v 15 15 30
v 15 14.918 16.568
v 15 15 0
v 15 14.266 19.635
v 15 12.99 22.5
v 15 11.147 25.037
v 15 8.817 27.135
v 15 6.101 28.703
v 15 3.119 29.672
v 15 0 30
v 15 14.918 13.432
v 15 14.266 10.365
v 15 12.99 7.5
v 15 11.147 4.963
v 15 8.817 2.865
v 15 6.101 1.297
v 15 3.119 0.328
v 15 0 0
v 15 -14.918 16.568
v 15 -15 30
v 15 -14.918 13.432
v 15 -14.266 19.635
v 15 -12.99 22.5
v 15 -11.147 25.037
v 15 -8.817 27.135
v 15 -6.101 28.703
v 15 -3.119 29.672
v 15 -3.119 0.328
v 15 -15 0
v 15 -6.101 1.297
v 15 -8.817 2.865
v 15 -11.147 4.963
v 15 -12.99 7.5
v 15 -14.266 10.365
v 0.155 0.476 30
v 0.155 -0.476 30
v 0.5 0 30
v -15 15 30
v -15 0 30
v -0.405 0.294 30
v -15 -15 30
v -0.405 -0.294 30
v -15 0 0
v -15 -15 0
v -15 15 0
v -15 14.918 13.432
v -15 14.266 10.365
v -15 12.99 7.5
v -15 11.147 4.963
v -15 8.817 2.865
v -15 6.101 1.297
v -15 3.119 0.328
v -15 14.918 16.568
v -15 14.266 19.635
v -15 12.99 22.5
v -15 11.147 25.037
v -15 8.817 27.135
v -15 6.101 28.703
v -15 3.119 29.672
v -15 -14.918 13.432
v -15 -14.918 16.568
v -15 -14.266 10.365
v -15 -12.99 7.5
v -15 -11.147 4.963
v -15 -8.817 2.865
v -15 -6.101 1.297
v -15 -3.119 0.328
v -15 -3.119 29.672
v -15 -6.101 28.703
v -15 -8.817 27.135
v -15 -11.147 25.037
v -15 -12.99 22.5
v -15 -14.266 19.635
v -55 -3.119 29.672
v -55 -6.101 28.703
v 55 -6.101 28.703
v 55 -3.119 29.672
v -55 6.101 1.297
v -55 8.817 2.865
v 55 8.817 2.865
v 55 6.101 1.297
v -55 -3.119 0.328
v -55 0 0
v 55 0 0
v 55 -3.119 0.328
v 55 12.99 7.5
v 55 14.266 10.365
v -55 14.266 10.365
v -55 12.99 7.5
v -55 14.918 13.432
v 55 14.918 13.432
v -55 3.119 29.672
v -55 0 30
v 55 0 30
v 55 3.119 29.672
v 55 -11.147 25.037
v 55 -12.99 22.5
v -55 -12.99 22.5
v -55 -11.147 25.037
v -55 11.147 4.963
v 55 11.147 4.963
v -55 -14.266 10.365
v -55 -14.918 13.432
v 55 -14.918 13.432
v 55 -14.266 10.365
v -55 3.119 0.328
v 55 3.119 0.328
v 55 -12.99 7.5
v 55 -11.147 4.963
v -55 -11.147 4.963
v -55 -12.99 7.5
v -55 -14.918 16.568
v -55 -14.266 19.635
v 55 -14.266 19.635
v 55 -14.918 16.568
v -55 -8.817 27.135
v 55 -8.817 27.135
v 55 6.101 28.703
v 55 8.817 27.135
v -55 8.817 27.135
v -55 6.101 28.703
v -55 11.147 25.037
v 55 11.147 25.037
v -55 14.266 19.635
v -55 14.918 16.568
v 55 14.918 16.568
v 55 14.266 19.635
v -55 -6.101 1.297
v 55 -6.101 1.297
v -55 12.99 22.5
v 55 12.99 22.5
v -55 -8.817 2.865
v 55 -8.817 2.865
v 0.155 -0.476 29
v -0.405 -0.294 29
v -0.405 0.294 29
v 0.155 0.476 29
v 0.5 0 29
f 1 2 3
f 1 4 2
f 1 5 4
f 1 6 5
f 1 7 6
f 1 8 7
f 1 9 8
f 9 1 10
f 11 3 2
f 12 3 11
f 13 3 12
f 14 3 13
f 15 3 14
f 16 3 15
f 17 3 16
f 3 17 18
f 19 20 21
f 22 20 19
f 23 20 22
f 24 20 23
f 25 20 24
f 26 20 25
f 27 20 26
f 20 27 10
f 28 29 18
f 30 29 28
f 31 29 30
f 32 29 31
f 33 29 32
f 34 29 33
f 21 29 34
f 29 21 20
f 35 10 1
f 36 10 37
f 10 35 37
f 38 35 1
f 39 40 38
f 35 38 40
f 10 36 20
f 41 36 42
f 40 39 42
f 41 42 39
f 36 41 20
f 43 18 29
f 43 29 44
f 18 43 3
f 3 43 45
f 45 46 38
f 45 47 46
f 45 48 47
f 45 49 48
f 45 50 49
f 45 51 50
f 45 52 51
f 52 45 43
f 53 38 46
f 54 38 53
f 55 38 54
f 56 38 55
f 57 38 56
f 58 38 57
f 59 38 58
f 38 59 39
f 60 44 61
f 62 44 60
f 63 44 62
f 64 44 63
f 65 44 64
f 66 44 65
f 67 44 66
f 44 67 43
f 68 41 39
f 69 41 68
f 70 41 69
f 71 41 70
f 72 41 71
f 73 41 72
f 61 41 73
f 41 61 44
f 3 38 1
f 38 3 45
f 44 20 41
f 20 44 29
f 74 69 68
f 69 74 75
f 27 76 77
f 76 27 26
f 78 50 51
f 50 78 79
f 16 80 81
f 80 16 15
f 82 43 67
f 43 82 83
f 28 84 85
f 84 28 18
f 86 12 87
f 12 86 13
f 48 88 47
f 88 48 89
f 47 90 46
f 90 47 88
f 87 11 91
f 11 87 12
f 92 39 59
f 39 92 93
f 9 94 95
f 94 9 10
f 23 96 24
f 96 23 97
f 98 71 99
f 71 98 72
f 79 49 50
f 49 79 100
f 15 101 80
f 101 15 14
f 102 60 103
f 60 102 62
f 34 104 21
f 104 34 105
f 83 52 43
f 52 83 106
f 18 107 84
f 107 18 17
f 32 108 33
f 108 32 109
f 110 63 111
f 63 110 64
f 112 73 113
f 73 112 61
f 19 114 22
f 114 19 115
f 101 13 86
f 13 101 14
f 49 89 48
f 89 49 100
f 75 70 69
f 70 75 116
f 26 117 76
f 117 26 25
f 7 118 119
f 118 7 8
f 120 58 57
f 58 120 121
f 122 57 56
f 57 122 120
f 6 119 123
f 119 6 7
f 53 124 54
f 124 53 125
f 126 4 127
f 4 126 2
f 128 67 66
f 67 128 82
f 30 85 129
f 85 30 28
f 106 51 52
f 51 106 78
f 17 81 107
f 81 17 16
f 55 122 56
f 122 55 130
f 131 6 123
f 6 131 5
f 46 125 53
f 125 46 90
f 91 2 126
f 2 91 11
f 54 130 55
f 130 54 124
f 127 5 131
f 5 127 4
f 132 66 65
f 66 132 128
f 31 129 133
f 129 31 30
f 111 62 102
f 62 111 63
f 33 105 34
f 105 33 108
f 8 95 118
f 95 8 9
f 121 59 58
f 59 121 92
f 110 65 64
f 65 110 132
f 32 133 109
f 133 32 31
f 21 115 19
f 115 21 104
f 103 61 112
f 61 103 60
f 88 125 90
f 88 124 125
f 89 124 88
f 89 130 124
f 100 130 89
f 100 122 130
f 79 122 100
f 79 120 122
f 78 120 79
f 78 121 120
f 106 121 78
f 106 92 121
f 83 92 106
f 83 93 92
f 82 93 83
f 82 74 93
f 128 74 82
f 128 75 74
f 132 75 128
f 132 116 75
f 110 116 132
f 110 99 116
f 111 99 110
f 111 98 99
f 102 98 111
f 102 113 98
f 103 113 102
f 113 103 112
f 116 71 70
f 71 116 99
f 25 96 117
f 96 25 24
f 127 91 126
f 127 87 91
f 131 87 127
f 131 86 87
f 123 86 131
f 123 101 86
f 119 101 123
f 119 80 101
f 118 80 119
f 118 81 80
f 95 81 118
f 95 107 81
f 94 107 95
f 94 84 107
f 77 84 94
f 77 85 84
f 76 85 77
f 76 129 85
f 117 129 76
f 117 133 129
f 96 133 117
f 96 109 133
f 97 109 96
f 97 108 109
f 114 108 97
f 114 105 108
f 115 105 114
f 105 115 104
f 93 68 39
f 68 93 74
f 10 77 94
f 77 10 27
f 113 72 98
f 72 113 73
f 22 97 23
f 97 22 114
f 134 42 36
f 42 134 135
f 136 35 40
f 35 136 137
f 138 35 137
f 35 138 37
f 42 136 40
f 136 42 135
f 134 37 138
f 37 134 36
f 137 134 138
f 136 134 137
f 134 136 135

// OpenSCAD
cube_size = 30; // [10:Small,20:Medium,30:Large]

hole_diameter = 1; 
hole_radius = hole_diameter/2;

// How deep should the center hole be?
hole_depth = 1; // [0,1,5,50]

show_wheels = "yes"; // [yes,no]

// How thick should the side wheels be?
wheel_thickness = 40; // [1:40]

// ignore this variable!
// foo=1;

// don't turn functions into params!
function BEZ03(u) = pow((1-u), 3);

// ignore variable values
bing = 3+4;
baz = 3 / hole_depth;

difference() {
  union() {
    translate([0, 0, cube_size/2]) cube([cube_size,cube_size,cube_size], center=true);
    if (show_wheels == "yes") {
      translate([0, 0, cube_size/2]) rotate([0, 90, 0]) {
        cylinder(r=cube_size/2, h=cube_size+(wheel_thickness*2), center=true);
      }
    }
  }
  translate([0, 0, cube_size-hole_depth]) cylinder(r=hole_radius, h=hole_depth);
}
        
